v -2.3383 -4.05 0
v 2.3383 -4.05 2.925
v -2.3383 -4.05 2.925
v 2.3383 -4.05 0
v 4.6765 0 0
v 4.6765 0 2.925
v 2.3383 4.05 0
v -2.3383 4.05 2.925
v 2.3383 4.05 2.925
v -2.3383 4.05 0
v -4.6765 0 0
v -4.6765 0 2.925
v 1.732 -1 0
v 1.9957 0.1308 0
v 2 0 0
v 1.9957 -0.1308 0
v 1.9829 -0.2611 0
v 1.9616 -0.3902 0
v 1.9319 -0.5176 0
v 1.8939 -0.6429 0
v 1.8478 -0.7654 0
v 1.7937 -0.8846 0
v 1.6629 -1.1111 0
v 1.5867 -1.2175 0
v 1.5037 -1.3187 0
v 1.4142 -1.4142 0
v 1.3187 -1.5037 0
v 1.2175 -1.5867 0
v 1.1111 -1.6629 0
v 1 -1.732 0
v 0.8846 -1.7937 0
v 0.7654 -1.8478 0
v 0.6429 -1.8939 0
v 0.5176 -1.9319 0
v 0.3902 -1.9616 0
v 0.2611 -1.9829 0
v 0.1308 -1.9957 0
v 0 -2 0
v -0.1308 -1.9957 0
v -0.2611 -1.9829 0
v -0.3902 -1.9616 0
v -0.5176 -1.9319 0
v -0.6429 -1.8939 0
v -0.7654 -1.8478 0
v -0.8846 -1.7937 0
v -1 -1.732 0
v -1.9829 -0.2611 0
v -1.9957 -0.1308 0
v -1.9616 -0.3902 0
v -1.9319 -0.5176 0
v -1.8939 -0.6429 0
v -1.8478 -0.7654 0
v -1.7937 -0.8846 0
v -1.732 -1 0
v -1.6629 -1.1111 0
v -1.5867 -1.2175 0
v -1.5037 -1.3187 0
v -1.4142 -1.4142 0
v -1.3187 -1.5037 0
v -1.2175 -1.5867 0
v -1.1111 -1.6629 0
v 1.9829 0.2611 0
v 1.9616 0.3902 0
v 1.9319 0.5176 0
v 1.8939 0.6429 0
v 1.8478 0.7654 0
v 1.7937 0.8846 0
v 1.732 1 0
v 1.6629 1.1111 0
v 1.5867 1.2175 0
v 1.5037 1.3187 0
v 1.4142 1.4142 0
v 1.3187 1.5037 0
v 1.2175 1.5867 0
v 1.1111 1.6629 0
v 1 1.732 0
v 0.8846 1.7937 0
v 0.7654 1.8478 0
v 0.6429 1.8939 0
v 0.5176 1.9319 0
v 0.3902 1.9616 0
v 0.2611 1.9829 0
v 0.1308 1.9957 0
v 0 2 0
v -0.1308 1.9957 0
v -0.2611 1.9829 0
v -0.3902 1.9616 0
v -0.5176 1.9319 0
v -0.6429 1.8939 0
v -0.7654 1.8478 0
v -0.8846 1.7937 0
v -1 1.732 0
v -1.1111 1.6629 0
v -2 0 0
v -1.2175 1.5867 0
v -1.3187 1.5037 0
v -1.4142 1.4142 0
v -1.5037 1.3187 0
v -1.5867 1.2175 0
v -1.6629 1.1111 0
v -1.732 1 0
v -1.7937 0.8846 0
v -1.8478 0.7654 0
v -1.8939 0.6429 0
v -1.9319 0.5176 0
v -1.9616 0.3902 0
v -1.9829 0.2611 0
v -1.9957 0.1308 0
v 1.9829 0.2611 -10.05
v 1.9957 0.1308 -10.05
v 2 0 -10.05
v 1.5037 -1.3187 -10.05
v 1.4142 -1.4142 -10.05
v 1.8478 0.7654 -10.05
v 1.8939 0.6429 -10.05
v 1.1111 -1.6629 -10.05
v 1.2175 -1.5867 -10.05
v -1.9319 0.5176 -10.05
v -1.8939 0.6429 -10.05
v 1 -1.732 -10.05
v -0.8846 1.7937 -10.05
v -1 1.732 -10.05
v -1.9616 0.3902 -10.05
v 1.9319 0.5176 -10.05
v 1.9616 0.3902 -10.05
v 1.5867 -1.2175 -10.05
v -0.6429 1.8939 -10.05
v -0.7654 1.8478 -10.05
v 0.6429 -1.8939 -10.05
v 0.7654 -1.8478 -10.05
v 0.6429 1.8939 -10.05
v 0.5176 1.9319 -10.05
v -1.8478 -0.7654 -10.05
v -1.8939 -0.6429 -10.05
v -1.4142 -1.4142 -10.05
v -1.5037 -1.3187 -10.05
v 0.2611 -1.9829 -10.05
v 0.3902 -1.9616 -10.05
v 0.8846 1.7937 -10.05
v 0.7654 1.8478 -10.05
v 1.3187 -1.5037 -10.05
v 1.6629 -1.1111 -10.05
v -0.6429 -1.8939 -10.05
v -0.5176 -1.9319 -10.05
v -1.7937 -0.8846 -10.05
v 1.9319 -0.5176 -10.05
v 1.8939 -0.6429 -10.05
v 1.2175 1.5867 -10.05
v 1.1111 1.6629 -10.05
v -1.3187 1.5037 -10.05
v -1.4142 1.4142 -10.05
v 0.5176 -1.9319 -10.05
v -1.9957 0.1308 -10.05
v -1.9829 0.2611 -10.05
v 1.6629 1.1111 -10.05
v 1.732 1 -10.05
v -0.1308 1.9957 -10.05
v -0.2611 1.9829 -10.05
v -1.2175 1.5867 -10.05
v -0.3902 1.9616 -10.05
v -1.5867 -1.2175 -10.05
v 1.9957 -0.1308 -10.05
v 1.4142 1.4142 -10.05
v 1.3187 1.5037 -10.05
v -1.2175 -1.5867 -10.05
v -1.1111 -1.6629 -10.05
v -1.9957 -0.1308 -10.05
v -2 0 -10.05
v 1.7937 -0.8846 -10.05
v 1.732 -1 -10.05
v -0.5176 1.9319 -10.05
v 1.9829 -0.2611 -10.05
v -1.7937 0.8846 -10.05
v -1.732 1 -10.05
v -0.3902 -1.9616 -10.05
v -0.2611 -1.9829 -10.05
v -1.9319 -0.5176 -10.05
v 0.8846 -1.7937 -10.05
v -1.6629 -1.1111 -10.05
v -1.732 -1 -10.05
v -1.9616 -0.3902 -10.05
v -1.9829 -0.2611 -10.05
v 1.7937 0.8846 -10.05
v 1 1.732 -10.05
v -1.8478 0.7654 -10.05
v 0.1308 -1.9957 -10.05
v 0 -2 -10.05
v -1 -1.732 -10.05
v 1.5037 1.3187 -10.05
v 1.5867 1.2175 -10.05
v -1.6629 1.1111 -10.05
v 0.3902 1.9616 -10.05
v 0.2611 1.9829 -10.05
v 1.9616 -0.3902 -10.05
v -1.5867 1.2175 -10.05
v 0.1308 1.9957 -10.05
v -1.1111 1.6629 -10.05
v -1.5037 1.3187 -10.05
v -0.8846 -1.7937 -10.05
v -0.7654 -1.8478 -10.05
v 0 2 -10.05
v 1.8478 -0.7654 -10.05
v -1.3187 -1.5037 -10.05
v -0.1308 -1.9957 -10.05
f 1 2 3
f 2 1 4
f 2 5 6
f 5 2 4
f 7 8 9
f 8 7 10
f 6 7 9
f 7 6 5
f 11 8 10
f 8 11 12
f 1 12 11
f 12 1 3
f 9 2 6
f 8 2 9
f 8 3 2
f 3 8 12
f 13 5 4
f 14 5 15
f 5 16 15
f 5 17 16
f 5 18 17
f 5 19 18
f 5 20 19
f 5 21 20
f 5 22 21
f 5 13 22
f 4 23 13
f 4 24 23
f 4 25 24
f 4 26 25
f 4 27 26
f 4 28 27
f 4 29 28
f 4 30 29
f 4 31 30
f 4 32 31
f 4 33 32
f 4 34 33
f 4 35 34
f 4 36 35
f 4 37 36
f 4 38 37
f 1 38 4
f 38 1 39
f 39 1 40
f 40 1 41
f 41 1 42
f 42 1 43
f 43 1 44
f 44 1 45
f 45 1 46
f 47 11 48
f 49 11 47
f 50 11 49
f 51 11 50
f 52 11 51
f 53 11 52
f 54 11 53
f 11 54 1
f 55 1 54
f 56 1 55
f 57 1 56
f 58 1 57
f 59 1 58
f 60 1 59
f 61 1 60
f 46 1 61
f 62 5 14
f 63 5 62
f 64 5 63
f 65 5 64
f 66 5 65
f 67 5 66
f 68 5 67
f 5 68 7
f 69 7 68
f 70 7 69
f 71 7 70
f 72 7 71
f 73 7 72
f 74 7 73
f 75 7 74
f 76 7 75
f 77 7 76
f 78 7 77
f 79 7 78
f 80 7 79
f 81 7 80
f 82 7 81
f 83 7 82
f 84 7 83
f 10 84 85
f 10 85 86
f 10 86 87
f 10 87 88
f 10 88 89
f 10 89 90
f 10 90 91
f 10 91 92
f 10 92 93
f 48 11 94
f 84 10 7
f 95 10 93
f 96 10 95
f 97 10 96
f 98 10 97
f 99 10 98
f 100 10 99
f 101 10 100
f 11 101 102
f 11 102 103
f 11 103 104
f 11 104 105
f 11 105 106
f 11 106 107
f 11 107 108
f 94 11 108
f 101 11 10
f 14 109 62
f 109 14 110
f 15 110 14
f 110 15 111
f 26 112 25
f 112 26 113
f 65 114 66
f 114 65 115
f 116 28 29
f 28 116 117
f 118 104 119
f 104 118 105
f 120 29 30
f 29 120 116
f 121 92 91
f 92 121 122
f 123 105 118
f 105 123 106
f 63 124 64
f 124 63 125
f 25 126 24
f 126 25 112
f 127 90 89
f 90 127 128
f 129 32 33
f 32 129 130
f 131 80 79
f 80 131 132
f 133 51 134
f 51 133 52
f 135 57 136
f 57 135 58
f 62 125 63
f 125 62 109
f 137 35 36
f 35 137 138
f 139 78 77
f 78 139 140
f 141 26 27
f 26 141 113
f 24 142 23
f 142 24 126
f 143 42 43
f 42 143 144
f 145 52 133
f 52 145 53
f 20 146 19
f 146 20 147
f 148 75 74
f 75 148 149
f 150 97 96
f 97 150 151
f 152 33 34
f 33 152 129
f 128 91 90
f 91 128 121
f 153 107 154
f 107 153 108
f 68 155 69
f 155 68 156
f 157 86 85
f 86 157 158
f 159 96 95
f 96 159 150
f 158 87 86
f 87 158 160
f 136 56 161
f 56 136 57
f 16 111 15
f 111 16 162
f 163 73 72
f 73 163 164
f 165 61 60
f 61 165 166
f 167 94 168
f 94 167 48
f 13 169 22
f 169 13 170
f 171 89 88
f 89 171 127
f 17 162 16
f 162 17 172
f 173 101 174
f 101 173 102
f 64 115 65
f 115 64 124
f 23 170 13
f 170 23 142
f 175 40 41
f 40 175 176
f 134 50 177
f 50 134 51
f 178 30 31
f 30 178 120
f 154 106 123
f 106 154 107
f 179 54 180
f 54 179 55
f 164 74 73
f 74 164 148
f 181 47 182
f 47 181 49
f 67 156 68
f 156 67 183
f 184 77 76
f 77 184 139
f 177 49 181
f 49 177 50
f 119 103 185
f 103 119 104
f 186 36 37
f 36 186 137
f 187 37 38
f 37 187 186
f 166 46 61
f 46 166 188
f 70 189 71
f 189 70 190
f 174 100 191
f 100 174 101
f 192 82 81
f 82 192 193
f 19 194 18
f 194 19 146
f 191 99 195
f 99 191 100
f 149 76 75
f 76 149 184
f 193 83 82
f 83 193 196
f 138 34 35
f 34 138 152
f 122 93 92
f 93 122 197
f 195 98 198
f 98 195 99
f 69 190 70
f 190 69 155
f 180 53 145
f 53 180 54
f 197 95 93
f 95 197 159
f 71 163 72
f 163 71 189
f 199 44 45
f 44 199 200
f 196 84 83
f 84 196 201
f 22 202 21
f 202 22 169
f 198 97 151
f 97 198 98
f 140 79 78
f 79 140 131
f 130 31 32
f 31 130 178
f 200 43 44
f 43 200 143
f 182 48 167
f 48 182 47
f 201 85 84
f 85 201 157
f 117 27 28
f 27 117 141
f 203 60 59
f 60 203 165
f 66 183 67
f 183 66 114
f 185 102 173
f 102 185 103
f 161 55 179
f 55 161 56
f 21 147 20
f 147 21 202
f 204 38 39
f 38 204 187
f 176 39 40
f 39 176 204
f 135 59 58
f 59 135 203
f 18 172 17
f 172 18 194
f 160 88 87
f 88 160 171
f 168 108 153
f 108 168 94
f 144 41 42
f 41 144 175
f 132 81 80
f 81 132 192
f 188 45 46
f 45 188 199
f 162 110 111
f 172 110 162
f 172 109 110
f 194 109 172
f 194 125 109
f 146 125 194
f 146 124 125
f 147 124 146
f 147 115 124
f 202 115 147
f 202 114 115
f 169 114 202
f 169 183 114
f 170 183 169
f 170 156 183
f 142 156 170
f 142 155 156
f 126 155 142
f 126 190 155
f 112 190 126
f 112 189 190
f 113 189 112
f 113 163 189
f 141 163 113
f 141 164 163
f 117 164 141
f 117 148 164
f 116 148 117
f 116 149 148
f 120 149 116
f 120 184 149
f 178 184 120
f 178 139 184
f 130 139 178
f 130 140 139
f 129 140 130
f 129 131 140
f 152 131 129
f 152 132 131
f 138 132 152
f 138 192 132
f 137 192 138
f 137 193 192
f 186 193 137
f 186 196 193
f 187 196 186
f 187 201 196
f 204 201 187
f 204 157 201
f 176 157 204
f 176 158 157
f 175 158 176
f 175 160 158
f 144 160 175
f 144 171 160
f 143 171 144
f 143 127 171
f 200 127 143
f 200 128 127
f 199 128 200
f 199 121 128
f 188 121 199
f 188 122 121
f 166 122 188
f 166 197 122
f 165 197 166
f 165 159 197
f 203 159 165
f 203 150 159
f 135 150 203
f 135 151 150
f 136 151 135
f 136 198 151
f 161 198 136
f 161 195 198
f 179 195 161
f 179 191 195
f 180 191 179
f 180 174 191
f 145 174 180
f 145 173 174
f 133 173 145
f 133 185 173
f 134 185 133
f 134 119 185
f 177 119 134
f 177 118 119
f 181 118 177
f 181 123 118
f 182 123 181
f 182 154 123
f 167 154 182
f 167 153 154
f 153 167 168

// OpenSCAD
// Hex head screw (single connected solid)
// Target: 4.0mm shaft diameter, 8.1mm hex head diameter (across flats),
//         head height 2.925mm, 10mm length under head.

shaft_diameter_mm      = 4.0;
length_under_head_mm   = 10.0;
head_diameter_mm       = 8.1;     // across flats
head_height_mm         = 2.925;

overlap_mm = 0.05;

$fn = 96;

module hex_head_screw() {
    r_shaft = shaft_diameter_mm/2;

    // For a hex made with cylinder($fn=6), the given radius is the circumradius.
    // Across flats (AF) = 2 * r * cos(30°)  =>  r = AF / (2*cos(30°))
    r_head = head_diameter_mm / (2 * cos(30));

    union() {
        // Hex head: underside at z=0, top at z=+head_height_mm
        translate([0, 0, head_height_mm/2])
            cylinder(h=head_height_mm, r=r_head, $fn=6, center=true);

        // Smooth shank: starts at underside of head (z=0) and extends to z=-length_under_head_mm
        translate([0, 0, -length_under_head_mm/2 - overlap_mm/2])
            cylinder(h=length_under_head_mm + overlap_mm, r=r_shaft, $fn=96, center=true);
    }
}

hex_head_screw();
